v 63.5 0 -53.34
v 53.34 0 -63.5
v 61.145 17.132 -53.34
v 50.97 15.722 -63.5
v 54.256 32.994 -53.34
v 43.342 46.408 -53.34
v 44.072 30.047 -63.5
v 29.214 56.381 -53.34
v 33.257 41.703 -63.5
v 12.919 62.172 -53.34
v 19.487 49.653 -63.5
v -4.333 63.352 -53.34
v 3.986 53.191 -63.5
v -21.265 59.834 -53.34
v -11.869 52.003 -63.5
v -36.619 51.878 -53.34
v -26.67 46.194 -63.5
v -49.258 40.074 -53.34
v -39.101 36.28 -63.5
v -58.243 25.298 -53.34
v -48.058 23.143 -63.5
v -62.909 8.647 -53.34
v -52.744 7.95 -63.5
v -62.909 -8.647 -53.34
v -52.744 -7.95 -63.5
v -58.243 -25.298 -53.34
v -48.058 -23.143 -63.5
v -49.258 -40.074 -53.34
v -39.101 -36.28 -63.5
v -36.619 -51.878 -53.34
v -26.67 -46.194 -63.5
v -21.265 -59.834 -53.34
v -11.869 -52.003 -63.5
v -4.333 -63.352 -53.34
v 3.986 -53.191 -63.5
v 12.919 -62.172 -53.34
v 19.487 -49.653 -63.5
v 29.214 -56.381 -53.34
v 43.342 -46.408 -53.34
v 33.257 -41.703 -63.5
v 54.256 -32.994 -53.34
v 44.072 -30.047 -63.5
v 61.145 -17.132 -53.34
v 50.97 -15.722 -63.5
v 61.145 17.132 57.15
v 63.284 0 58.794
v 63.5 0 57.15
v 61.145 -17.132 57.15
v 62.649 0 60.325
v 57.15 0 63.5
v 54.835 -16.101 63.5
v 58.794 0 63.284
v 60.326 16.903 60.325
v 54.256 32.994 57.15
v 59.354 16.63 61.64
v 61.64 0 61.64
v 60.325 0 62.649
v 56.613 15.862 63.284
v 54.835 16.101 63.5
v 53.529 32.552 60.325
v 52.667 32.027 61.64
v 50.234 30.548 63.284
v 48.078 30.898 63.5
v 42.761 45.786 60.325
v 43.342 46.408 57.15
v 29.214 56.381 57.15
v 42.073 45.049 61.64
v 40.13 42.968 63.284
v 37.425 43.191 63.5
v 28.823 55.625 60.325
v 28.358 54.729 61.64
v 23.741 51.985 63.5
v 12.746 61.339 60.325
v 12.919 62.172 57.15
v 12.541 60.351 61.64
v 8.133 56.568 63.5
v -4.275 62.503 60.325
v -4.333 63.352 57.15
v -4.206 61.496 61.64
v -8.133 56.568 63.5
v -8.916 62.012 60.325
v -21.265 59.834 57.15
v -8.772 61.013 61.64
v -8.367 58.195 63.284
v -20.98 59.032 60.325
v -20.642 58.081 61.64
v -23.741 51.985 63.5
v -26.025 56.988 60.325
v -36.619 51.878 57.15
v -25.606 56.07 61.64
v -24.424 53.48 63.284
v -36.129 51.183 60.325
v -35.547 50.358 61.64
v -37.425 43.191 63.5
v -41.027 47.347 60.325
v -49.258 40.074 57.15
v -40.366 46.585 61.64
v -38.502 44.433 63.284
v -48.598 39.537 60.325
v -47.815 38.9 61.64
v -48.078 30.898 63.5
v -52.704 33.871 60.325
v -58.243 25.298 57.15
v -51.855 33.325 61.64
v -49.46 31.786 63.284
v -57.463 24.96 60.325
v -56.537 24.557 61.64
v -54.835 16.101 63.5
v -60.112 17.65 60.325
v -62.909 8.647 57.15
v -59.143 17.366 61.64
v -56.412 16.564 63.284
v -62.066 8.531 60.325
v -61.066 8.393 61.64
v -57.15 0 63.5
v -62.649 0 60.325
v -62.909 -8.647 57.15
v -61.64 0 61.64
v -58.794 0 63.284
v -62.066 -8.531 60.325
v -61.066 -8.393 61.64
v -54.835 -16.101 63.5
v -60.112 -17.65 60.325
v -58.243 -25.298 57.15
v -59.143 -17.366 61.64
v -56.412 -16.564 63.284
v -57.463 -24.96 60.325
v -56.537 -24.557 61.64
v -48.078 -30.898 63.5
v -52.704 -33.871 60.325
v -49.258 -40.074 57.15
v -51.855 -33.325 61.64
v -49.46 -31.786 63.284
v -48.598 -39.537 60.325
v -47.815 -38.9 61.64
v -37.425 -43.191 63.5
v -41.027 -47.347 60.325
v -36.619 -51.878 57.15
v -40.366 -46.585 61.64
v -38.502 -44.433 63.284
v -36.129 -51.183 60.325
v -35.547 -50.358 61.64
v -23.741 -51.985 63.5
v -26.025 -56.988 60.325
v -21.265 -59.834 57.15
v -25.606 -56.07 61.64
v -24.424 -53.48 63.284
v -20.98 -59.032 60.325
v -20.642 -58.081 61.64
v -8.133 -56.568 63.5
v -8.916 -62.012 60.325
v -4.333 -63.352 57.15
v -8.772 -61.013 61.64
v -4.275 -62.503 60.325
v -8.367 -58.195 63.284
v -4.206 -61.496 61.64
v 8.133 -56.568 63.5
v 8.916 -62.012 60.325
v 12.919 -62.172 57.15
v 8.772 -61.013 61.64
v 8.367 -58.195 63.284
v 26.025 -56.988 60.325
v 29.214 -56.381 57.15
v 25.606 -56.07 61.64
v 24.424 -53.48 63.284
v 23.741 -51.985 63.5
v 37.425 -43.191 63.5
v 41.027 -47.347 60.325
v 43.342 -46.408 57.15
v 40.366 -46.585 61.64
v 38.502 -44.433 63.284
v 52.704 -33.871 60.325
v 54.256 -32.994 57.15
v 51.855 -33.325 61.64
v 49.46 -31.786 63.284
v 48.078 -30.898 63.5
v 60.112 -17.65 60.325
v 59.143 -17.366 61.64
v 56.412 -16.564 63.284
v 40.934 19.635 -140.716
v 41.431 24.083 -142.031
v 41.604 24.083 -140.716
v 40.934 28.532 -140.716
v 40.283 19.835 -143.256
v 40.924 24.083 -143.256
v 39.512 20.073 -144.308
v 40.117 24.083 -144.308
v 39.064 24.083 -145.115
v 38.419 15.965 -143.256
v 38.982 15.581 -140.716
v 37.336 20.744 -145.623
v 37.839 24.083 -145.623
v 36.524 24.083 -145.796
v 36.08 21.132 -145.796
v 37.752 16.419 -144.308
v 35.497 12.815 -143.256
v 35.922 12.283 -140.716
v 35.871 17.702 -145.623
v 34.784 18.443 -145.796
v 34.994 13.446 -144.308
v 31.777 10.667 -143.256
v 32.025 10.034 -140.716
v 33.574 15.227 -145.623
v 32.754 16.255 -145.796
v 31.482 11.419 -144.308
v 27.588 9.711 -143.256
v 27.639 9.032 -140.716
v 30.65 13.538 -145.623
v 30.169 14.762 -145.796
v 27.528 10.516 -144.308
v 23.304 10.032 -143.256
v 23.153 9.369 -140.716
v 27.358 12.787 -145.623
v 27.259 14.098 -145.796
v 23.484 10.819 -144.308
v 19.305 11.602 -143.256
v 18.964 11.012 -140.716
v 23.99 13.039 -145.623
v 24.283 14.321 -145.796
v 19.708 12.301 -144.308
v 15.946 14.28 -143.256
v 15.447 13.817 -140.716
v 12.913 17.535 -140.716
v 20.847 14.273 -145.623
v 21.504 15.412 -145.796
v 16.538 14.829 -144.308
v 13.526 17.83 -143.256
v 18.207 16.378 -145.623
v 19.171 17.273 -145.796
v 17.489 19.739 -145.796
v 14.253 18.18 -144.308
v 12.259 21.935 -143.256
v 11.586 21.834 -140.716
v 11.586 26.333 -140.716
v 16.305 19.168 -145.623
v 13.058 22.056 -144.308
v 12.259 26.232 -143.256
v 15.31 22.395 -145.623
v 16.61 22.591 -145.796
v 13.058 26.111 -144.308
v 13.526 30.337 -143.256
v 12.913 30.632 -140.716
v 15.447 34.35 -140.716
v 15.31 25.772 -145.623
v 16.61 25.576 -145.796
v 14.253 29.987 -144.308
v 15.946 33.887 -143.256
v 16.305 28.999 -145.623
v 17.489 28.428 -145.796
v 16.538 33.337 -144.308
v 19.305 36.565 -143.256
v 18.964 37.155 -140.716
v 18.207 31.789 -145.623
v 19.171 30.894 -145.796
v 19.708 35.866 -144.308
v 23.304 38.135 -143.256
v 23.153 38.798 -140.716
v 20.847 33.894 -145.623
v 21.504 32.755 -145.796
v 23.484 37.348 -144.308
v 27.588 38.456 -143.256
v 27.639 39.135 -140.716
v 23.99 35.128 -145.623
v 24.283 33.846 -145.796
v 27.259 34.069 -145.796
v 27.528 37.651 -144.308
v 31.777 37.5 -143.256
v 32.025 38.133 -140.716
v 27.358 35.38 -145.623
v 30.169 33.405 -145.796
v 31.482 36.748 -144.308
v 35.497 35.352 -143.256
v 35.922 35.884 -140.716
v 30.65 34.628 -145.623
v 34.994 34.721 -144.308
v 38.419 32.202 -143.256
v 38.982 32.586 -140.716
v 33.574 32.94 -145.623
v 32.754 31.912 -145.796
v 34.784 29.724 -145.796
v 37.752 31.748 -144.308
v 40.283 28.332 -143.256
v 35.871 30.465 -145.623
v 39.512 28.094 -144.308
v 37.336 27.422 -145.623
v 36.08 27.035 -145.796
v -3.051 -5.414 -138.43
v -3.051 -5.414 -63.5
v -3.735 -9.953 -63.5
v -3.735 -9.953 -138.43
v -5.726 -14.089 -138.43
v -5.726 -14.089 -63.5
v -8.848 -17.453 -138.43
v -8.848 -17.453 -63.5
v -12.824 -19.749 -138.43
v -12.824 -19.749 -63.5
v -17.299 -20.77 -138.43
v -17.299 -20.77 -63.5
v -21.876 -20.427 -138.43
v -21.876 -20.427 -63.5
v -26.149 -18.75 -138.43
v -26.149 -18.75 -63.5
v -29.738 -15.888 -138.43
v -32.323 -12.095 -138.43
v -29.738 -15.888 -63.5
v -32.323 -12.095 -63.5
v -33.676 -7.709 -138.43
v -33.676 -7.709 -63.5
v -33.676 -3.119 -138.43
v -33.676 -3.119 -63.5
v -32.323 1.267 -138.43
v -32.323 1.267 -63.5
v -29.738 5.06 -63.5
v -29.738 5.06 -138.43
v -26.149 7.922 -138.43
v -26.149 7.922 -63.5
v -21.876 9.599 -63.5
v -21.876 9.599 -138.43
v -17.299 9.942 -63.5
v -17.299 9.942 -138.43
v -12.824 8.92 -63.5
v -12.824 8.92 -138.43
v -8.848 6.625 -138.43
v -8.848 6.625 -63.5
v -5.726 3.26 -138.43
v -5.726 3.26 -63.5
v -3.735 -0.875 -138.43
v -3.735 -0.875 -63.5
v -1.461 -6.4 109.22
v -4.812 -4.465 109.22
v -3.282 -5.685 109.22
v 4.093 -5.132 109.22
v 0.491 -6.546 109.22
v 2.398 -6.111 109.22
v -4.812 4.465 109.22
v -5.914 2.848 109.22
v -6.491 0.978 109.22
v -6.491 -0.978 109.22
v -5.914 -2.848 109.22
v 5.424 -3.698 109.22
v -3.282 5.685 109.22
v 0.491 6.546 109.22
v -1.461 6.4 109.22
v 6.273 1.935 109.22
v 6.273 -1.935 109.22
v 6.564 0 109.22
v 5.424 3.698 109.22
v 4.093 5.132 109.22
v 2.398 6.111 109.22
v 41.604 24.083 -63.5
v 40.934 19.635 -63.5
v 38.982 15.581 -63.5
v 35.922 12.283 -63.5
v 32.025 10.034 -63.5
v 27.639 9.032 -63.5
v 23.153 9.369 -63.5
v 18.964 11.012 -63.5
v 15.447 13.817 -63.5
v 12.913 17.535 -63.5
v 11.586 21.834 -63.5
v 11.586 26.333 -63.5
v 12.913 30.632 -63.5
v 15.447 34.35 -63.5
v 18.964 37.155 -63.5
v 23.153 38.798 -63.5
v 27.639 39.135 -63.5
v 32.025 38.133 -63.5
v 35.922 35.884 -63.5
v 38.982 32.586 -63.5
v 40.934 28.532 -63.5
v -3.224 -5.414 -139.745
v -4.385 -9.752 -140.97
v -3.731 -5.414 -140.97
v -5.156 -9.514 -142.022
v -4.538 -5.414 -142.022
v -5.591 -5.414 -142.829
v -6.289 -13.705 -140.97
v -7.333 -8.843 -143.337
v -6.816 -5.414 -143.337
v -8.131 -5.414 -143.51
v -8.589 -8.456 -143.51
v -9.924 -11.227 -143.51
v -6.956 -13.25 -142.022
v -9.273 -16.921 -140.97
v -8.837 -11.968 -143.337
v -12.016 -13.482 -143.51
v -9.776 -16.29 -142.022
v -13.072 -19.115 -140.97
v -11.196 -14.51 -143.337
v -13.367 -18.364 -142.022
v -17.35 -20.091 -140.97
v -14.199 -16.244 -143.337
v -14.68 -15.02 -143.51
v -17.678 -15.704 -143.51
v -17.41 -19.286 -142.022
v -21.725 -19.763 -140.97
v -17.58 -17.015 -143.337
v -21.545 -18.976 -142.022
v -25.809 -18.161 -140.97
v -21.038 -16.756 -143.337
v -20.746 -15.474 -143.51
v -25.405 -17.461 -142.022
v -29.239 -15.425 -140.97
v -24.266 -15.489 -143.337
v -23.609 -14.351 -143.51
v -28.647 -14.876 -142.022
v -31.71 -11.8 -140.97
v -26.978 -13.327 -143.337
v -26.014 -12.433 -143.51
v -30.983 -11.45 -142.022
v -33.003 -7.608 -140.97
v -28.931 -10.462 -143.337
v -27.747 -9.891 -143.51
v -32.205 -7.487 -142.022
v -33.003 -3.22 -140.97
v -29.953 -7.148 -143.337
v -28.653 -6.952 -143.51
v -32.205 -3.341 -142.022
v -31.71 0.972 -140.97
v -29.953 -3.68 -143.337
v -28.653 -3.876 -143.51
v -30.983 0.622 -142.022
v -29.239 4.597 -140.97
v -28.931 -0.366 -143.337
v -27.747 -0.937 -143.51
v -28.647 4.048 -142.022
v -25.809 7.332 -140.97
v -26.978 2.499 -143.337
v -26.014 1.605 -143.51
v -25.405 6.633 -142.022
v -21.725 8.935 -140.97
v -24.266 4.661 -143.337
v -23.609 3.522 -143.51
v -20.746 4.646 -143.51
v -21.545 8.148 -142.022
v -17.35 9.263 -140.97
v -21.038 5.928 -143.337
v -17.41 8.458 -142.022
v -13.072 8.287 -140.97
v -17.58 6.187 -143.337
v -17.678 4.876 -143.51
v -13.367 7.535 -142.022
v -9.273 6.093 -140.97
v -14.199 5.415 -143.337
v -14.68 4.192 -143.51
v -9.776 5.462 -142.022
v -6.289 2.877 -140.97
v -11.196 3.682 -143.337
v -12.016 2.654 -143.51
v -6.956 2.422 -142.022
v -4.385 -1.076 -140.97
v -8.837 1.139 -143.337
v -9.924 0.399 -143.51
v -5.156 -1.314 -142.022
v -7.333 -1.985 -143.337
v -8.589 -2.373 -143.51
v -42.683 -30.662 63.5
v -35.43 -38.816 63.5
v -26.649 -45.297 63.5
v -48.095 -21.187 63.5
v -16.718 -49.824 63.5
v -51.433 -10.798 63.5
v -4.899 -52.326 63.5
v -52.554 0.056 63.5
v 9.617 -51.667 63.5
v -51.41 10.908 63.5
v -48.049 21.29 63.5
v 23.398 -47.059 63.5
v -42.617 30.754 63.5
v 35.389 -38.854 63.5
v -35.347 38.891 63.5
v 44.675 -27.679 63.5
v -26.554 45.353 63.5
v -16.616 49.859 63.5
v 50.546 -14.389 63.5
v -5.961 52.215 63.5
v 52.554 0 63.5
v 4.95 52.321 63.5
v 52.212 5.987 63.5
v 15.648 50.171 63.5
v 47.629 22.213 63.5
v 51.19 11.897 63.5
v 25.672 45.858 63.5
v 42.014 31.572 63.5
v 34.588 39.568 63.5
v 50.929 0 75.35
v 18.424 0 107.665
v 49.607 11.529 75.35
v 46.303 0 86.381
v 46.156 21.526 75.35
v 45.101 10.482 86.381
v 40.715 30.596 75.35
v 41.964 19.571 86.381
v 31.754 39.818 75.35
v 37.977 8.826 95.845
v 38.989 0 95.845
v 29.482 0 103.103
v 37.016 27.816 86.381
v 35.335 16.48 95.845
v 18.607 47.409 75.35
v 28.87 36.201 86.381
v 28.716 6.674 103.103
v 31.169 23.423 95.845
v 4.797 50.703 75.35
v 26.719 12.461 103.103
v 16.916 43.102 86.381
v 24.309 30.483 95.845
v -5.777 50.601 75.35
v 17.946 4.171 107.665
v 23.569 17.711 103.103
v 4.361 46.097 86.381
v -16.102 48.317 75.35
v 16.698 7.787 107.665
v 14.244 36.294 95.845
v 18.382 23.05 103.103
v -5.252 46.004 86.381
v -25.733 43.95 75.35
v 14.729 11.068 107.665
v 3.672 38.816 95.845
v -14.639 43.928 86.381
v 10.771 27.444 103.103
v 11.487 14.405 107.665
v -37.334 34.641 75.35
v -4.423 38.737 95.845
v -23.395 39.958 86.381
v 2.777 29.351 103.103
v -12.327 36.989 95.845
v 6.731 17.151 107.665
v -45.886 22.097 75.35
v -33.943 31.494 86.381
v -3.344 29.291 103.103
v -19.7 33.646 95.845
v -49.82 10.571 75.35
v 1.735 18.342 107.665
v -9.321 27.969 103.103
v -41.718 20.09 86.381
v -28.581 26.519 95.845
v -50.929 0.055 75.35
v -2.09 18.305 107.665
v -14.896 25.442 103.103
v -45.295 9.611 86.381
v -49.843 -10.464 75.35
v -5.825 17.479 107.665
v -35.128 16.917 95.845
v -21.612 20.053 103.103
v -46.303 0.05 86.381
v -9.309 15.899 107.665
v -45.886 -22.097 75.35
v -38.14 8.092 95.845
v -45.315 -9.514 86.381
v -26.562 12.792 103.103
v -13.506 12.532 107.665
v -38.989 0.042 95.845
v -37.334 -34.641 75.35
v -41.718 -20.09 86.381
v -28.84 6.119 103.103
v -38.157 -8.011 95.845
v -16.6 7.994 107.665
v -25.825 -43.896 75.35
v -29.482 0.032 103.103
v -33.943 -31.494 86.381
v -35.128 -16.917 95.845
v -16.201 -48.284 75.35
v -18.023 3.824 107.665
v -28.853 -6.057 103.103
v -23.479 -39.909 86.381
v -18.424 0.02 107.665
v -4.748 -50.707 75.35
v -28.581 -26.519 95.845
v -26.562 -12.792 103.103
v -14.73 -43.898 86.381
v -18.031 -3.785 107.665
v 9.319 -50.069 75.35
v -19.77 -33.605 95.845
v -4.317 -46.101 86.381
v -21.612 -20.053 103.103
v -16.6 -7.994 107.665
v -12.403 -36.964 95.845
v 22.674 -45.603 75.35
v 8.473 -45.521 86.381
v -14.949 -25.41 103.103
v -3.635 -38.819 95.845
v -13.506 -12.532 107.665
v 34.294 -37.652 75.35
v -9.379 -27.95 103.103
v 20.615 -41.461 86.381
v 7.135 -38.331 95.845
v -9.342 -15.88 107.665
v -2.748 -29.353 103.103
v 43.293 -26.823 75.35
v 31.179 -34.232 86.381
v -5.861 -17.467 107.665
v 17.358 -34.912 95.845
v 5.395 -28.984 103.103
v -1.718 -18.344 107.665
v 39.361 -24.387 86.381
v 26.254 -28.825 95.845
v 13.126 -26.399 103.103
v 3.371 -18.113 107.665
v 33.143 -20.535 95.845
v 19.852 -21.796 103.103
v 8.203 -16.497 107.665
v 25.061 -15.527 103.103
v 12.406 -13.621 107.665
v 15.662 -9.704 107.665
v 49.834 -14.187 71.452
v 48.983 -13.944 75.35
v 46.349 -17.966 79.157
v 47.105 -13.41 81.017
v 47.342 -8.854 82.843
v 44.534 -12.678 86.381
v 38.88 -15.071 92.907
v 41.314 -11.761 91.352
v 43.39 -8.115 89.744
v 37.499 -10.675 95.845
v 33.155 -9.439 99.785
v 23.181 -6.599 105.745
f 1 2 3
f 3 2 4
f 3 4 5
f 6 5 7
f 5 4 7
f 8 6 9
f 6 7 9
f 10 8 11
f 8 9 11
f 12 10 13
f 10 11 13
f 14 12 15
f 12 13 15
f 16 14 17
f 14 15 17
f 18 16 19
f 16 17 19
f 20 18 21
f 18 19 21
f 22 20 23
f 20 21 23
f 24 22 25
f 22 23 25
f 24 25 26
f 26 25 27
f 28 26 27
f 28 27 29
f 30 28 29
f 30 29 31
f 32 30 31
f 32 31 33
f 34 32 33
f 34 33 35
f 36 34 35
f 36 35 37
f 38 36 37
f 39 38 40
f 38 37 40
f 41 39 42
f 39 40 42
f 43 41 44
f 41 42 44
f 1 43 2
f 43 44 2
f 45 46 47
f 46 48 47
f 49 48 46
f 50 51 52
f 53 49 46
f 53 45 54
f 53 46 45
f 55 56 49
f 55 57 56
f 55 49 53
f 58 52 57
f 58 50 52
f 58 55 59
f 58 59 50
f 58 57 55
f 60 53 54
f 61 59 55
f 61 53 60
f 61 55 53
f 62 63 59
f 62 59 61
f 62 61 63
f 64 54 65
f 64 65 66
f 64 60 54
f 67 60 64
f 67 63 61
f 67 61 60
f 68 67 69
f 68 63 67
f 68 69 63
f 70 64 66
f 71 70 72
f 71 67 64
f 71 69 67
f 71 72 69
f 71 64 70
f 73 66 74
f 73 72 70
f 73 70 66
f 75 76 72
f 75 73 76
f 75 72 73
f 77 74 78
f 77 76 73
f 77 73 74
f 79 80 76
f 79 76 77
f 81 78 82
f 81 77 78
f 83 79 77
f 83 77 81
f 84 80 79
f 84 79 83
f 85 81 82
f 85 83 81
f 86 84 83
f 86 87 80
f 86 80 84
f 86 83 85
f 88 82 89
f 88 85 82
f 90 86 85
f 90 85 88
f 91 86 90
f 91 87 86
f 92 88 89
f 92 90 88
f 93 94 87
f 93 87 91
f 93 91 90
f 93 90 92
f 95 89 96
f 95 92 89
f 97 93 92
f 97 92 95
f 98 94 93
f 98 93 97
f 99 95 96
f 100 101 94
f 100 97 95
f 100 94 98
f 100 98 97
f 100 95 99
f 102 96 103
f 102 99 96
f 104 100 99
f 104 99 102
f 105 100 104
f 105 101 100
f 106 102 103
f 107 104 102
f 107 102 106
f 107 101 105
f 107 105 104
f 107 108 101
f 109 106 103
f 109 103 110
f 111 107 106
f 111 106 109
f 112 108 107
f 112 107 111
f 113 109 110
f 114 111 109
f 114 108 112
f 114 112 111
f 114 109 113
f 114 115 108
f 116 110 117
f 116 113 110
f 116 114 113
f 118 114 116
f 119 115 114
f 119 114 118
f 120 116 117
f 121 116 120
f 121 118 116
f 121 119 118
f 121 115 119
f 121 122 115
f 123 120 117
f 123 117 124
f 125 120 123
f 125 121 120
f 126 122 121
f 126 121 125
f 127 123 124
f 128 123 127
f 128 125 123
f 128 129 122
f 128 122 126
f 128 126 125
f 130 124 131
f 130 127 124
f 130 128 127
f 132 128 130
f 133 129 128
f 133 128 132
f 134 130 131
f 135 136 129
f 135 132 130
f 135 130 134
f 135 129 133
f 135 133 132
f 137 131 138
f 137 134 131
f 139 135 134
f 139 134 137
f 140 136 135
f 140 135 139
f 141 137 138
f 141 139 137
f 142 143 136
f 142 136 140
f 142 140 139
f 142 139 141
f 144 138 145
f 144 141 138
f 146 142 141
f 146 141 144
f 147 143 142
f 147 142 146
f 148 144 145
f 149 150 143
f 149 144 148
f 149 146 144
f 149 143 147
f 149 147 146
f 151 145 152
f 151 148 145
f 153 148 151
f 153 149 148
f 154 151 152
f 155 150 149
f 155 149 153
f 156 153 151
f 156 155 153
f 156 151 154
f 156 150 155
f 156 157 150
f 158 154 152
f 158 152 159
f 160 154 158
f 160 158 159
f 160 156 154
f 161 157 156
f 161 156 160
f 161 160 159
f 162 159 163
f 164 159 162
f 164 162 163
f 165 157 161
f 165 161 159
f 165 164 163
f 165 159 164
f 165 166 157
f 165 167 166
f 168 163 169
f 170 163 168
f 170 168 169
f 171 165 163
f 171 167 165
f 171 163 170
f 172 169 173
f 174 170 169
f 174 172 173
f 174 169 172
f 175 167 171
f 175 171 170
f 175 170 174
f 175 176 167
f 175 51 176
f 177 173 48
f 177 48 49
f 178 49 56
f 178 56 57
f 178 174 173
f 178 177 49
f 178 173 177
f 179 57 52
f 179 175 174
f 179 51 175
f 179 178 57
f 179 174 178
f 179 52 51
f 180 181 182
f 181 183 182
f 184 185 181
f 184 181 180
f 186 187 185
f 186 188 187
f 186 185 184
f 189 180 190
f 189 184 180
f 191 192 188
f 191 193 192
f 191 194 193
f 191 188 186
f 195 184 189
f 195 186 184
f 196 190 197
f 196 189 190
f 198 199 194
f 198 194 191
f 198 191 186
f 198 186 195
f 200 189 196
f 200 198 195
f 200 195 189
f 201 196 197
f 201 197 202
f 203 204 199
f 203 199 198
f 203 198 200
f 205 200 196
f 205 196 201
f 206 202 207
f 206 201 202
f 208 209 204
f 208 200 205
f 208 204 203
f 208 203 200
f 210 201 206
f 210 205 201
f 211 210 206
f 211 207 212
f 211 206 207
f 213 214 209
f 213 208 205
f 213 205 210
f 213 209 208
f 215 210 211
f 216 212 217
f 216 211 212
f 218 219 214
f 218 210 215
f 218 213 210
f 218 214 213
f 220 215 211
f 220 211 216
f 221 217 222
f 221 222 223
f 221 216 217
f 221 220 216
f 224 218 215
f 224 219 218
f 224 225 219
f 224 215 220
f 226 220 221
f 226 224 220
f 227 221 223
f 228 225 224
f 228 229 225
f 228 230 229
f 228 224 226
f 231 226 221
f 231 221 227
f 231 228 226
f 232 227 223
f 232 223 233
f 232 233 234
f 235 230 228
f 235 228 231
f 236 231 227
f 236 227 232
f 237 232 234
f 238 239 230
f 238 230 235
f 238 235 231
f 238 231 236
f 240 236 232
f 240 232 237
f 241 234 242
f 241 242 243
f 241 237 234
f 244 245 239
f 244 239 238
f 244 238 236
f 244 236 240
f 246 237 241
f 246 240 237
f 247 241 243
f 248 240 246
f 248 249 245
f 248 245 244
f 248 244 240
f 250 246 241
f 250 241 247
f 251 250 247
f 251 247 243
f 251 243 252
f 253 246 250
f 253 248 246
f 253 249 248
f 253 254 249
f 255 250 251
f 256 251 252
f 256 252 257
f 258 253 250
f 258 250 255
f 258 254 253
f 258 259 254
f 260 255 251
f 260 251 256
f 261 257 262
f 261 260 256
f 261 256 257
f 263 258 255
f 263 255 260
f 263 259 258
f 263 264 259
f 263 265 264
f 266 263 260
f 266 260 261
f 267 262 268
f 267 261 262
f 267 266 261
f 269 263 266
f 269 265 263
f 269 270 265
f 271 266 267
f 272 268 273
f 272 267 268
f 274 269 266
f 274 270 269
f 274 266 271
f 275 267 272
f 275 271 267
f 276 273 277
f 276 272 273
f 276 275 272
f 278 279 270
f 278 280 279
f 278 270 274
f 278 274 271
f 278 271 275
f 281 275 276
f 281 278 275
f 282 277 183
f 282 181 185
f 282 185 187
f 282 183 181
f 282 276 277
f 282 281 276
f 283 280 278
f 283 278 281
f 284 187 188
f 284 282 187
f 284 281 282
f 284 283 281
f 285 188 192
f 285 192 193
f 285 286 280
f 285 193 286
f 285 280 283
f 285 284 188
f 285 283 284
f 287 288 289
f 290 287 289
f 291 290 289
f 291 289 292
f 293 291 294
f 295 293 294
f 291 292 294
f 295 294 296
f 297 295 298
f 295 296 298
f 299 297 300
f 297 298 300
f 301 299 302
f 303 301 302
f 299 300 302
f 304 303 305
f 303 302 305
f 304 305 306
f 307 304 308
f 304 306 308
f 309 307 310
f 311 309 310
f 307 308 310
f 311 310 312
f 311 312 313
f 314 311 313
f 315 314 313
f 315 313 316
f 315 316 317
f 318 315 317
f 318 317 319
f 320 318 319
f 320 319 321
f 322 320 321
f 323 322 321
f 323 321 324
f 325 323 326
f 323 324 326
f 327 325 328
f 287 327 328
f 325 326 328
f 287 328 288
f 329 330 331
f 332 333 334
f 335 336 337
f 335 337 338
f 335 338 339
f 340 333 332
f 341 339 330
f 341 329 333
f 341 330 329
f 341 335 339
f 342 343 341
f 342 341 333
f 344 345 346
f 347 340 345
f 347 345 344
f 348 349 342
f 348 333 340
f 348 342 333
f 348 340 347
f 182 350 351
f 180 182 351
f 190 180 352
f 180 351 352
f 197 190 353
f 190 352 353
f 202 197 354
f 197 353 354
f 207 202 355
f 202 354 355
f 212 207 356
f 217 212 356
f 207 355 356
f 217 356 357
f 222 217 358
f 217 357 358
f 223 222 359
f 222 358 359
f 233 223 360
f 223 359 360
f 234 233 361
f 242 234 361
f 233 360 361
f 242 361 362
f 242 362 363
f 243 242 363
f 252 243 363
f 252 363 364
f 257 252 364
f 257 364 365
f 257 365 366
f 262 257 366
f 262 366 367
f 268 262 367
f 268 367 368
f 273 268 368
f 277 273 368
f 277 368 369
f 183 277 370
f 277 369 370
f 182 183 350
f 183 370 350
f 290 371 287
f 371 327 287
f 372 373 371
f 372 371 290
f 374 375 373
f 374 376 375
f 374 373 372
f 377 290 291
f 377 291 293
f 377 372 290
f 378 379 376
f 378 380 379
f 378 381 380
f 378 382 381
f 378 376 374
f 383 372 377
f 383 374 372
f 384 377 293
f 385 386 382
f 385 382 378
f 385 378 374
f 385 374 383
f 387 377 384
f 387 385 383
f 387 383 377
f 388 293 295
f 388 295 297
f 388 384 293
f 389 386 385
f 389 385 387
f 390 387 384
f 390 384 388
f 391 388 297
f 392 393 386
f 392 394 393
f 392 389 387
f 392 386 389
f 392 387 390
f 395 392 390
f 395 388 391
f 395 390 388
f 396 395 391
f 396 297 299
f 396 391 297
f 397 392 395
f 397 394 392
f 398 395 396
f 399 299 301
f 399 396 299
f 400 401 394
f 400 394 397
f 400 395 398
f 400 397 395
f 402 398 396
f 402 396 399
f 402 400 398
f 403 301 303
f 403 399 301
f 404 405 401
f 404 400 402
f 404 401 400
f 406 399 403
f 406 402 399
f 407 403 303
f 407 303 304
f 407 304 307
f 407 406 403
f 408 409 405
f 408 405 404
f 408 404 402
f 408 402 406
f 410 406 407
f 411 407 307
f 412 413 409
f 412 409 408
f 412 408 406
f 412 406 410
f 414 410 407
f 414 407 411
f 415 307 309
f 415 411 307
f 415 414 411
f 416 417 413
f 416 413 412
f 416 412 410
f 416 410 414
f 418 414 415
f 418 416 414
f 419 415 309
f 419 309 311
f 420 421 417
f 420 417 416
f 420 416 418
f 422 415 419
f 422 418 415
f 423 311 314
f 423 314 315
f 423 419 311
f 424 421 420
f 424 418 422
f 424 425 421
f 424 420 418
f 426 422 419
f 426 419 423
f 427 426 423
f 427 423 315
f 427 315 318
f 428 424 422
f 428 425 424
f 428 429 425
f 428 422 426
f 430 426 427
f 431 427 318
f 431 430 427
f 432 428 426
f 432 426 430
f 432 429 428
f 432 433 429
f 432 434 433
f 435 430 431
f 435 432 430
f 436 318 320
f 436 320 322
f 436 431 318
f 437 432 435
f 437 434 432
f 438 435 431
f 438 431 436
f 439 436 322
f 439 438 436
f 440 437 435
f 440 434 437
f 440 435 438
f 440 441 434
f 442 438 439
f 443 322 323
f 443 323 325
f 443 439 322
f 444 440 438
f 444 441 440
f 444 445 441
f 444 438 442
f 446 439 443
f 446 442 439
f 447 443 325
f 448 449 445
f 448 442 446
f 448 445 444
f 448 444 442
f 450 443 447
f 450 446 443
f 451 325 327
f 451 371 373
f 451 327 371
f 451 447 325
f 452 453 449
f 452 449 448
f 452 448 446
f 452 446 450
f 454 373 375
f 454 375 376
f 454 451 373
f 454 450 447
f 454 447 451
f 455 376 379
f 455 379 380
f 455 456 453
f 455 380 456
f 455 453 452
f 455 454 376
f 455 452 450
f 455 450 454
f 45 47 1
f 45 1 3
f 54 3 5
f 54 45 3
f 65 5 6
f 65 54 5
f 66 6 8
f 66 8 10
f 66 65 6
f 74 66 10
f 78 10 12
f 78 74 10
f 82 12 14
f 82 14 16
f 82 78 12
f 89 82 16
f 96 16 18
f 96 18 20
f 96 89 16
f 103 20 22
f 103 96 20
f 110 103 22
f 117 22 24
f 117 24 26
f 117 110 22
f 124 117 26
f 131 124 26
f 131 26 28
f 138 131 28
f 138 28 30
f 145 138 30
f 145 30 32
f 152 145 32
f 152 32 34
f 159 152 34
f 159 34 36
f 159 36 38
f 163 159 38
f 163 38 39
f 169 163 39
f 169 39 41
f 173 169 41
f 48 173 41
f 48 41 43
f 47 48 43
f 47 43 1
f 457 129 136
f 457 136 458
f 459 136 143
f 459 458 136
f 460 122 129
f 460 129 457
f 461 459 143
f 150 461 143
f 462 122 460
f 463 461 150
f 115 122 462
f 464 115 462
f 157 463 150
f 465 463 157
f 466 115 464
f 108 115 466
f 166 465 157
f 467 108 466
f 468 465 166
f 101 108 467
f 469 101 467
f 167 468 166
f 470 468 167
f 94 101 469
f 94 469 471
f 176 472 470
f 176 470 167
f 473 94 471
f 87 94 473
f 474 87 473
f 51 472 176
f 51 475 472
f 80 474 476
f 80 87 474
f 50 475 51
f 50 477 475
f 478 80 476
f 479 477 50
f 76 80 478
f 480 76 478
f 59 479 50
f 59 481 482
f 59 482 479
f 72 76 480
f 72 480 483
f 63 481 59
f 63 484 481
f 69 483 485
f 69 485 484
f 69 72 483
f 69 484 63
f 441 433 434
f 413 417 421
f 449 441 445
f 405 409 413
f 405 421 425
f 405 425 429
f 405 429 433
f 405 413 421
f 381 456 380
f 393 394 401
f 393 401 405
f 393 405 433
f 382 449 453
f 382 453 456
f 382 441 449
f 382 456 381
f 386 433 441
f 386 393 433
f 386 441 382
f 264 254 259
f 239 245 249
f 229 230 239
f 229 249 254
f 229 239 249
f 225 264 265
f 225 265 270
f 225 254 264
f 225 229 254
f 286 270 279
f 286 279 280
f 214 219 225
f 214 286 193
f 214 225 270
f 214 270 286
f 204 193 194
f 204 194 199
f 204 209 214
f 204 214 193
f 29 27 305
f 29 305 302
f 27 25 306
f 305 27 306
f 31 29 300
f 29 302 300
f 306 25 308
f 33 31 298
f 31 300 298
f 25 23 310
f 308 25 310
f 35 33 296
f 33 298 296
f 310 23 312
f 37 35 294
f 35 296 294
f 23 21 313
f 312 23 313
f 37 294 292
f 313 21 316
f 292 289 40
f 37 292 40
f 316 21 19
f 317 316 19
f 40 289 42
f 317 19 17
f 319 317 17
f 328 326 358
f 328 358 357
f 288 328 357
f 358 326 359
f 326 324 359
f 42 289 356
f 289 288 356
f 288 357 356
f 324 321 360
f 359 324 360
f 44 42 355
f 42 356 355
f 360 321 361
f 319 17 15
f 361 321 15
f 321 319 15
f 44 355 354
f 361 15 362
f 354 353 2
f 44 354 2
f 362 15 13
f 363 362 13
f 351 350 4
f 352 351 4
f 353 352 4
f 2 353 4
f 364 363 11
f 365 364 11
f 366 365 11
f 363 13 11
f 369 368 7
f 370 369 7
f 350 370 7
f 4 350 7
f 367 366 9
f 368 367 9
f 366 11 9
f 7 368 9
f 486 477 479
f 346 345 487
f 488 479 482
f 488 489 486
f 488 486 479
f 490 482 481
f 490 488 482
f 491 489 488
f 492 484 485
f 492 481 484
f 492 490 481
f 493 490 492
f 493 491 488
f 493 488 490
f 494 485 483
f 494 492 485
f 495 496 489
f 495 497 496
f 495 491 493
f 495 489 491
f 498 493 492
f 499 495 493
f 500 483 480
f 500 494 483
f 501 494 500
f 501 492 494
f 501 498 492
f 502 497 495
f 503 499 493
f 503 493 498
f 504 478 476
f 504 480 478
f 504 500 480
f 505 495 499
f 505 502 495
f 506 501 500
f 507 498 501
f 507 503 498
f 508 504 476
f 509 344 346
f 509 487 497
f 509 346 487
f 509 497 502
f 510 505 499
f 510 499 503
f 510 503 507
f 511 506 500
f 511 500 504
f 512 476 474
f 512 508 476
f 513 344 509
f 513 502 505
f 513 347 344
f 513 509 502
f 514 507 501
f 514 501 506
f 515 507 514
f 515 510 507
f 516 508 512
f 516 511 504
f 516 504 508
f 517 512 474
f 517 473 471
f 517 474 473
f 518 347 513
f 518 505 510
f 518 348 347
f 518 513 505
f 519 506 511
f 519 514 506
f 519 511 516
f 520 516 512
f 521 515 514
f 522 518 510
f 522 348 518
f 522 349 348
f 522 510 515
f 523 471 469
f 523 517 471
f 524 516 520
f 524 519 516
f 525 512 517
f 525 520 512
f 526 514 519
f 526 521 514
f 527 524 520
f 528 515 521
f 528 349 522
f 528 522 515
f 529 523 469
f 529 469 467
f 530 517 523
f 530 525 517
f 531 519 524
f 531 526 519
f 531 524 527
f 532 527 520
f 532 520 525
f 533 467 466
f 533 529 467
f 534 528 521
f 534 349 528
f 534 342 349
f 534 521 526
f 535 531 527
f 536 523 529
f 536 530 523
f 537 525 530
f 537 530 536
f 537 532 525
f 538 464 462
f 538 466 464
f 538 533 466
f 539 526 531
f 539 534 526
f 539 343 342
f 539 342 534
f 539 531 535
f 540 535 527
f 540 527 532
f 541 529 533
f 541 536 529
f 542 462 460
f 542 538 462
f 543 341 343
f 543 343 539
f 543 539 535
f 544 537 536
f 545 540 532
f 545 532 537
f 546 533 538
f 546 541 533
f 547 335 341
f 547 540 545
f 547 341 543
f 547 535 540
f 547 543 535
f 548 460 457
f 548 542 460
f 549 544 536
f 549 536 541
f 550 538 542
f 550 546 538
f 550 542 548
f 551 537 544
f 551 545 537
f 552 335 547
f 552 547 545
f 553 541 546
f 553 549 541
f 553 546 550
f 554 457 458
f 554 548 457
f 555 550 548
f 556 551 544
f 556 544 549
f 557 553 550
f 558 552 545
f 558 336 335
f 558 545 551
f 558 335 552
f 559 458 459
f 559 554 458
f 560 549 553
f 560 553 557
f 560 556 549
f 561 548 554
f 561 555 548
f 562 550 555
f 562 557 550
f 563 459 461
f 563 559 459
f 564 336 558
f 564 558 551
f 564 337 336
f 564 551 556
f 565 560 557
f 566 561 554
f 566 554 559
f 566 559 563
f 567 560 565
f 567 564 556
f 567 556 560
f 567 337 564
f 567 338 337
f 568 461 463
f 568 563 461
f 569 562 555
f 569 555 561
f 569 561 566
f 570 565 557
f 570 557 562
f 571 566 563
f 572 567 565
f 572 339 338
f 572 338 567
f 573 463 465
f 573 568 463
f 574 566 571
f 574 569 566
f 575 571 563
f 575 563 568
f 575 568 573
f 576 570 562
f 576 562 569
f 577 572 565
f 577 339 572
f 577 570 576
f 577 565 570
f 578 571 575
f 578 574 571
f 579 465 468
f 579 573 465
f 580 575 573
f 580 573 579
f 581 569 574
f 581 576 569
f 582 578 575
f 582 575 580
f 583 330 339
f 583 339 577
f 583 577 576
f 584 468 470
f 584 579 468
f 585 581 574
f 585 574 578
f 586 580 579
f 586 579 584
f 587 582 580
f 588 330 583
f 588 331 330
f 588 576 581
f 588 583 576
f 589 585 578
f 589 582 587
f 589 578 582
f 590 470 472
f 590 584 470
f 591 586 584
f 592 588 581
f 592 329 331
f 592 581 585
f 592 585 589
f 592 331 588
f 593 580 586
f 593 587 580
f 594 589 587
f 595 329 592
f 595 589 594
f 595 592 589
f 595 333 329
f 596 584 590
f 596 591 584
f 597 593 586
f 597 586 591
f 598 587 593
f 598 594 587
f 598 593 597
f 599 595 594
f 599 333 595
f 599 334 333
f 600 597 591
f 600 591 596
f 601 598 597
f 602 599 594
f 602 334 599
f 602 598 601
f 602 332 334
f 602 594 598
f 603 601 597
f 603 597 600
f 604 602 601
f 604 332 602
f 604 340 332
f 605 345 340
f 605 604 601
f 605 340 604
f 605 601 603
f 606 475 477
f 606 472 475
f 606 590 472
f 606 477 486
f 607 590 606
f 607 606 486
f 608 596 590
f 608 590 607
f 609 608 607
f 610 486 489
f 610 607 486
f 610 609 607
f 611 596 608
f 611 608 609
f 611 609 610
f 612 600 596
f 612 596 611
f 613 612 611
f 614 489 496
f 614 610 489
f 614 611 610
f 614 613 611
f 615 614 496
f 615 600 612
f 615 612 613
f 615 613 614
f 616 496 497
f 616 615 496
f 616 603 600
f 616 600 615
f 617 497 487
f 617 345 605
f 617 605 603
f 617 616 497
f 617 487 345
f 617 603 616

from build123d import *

# Parameters (mm, degrees)
F0_R          = 63.5
F1_DEPTH      = 63.5
F1_DEPTH_BACK = 63.5
F2_SIZE       = 10.16
F3_R          = 6.35
F4_R          = 52.5552622302
F5_DEPTH      = 45.72
F8_R          = 15.0932692433
F9_DEPTH      = 82.296
F10_R         = 5.08
F11_R         = 15.3989584518
F12_DEPTH     = 80.01
F13_R         = 5.08


# Not quite as in the source:
# - a fillet or chamfer that OpenCascade refuses, or shapes differently, is made with other operations: its cross-section is extruded or revolved along the edge and cut away or added


with BuildPart() as f1:
    # F0 (on Top) → F1 (new body, two sides)
    with BuildSketch(Plane.XY) as f1_sk:
        Circle(F0_R)
    extrude(amount=F1_DEPTH)
    extrude(f1_sk.sketch, amount=-F1_DEPTH_BACK)

    # F2
    f2_edges = [f1.edges().sort_by_distance(p)[0] for p in [
        (-63.5, 0, -63.5),
    ]]
    chamfer(f2_edges, length=F2_SIZE)

    # F3
    f3_edges = [f1.edges().sort_by_distance(p)[0] for p in [
        (-63.5, 0, 63.5),
    ]]
    fillet(f3_edges, radius=F3_R)

    # F4 (on face) → F5 (join)
    with BuildSketch(Plane.XY.offset(63.5)):
        Circle(F4_R)
    extrude(amount=F5_DEPTH)

    # F6: fillet of radius 45.9907683632 on 1 edges, made by hand


with BuildPart() as f6_tool2:
    # F6_s3 → F6_t4 (revolve)
    with BuildSketch(Plane.XZ):
        with BuildLine():
            ThreePointArc((52.5552622302, 63.2292316368), (39.0848780486, 95.7496158184), (6.564493867, 109.22))
            Line((6.564493867, 109.22), (52.5552622302, 109.22))
            Line((52.5552622302, 109.22), (52.5552622302, 63.2292316368))
        make_face()
    revolve(axis=Axis((0, 0, 109.22), (0, 0, 1)))

    split(bisect_by=Plane.XY.offset(63.5), keep=Keep.TOP)


with BuildPart() as f1_1:
    add(f1.part)

    # F6_t1: cut F6_tool2
    add(f6_tool2.part, mode=Mode.SUBTRACT)

    # F8 (on face) → F9 (join)
    with BuildSketch(Plane(origin=(0, 0, -63.5), x_dir=(1, 0, 0), z_dir=(0, 0, -1))):
        with Locations((26.5111289918, -24.0834727883)):
            Circle(F8_R)
    extrude(amount=F9_DEPTH)

    # F10
    f10_edges = [f1_1.edges().sort_by_distance(p)[0] for p in [
        (11.41786, 24.083473, -145.796),
    ]]
    fillet(f10_edges, radius=F10_R)

    # F11 (on face) → F12 (join)
    with BuildSketch(Plane(origin=(0, 0, -63.5), x_dir=(1, 0, 0), z_dir=(0, 0, -1))):
        with Locations((-18.4494890273, 5.414089188)):
            Circle(F11_R)
    extrude(amount=F12_DEPTH)

    # F13
    f13_edges = [f1_1.edges().sort_by_distance(p)[0] for p in [
        (-33.848447, -5.414089, -143.51),
    ]]
    fillet(f13_edges, radius=F13_R)


solid = f1_1.part
